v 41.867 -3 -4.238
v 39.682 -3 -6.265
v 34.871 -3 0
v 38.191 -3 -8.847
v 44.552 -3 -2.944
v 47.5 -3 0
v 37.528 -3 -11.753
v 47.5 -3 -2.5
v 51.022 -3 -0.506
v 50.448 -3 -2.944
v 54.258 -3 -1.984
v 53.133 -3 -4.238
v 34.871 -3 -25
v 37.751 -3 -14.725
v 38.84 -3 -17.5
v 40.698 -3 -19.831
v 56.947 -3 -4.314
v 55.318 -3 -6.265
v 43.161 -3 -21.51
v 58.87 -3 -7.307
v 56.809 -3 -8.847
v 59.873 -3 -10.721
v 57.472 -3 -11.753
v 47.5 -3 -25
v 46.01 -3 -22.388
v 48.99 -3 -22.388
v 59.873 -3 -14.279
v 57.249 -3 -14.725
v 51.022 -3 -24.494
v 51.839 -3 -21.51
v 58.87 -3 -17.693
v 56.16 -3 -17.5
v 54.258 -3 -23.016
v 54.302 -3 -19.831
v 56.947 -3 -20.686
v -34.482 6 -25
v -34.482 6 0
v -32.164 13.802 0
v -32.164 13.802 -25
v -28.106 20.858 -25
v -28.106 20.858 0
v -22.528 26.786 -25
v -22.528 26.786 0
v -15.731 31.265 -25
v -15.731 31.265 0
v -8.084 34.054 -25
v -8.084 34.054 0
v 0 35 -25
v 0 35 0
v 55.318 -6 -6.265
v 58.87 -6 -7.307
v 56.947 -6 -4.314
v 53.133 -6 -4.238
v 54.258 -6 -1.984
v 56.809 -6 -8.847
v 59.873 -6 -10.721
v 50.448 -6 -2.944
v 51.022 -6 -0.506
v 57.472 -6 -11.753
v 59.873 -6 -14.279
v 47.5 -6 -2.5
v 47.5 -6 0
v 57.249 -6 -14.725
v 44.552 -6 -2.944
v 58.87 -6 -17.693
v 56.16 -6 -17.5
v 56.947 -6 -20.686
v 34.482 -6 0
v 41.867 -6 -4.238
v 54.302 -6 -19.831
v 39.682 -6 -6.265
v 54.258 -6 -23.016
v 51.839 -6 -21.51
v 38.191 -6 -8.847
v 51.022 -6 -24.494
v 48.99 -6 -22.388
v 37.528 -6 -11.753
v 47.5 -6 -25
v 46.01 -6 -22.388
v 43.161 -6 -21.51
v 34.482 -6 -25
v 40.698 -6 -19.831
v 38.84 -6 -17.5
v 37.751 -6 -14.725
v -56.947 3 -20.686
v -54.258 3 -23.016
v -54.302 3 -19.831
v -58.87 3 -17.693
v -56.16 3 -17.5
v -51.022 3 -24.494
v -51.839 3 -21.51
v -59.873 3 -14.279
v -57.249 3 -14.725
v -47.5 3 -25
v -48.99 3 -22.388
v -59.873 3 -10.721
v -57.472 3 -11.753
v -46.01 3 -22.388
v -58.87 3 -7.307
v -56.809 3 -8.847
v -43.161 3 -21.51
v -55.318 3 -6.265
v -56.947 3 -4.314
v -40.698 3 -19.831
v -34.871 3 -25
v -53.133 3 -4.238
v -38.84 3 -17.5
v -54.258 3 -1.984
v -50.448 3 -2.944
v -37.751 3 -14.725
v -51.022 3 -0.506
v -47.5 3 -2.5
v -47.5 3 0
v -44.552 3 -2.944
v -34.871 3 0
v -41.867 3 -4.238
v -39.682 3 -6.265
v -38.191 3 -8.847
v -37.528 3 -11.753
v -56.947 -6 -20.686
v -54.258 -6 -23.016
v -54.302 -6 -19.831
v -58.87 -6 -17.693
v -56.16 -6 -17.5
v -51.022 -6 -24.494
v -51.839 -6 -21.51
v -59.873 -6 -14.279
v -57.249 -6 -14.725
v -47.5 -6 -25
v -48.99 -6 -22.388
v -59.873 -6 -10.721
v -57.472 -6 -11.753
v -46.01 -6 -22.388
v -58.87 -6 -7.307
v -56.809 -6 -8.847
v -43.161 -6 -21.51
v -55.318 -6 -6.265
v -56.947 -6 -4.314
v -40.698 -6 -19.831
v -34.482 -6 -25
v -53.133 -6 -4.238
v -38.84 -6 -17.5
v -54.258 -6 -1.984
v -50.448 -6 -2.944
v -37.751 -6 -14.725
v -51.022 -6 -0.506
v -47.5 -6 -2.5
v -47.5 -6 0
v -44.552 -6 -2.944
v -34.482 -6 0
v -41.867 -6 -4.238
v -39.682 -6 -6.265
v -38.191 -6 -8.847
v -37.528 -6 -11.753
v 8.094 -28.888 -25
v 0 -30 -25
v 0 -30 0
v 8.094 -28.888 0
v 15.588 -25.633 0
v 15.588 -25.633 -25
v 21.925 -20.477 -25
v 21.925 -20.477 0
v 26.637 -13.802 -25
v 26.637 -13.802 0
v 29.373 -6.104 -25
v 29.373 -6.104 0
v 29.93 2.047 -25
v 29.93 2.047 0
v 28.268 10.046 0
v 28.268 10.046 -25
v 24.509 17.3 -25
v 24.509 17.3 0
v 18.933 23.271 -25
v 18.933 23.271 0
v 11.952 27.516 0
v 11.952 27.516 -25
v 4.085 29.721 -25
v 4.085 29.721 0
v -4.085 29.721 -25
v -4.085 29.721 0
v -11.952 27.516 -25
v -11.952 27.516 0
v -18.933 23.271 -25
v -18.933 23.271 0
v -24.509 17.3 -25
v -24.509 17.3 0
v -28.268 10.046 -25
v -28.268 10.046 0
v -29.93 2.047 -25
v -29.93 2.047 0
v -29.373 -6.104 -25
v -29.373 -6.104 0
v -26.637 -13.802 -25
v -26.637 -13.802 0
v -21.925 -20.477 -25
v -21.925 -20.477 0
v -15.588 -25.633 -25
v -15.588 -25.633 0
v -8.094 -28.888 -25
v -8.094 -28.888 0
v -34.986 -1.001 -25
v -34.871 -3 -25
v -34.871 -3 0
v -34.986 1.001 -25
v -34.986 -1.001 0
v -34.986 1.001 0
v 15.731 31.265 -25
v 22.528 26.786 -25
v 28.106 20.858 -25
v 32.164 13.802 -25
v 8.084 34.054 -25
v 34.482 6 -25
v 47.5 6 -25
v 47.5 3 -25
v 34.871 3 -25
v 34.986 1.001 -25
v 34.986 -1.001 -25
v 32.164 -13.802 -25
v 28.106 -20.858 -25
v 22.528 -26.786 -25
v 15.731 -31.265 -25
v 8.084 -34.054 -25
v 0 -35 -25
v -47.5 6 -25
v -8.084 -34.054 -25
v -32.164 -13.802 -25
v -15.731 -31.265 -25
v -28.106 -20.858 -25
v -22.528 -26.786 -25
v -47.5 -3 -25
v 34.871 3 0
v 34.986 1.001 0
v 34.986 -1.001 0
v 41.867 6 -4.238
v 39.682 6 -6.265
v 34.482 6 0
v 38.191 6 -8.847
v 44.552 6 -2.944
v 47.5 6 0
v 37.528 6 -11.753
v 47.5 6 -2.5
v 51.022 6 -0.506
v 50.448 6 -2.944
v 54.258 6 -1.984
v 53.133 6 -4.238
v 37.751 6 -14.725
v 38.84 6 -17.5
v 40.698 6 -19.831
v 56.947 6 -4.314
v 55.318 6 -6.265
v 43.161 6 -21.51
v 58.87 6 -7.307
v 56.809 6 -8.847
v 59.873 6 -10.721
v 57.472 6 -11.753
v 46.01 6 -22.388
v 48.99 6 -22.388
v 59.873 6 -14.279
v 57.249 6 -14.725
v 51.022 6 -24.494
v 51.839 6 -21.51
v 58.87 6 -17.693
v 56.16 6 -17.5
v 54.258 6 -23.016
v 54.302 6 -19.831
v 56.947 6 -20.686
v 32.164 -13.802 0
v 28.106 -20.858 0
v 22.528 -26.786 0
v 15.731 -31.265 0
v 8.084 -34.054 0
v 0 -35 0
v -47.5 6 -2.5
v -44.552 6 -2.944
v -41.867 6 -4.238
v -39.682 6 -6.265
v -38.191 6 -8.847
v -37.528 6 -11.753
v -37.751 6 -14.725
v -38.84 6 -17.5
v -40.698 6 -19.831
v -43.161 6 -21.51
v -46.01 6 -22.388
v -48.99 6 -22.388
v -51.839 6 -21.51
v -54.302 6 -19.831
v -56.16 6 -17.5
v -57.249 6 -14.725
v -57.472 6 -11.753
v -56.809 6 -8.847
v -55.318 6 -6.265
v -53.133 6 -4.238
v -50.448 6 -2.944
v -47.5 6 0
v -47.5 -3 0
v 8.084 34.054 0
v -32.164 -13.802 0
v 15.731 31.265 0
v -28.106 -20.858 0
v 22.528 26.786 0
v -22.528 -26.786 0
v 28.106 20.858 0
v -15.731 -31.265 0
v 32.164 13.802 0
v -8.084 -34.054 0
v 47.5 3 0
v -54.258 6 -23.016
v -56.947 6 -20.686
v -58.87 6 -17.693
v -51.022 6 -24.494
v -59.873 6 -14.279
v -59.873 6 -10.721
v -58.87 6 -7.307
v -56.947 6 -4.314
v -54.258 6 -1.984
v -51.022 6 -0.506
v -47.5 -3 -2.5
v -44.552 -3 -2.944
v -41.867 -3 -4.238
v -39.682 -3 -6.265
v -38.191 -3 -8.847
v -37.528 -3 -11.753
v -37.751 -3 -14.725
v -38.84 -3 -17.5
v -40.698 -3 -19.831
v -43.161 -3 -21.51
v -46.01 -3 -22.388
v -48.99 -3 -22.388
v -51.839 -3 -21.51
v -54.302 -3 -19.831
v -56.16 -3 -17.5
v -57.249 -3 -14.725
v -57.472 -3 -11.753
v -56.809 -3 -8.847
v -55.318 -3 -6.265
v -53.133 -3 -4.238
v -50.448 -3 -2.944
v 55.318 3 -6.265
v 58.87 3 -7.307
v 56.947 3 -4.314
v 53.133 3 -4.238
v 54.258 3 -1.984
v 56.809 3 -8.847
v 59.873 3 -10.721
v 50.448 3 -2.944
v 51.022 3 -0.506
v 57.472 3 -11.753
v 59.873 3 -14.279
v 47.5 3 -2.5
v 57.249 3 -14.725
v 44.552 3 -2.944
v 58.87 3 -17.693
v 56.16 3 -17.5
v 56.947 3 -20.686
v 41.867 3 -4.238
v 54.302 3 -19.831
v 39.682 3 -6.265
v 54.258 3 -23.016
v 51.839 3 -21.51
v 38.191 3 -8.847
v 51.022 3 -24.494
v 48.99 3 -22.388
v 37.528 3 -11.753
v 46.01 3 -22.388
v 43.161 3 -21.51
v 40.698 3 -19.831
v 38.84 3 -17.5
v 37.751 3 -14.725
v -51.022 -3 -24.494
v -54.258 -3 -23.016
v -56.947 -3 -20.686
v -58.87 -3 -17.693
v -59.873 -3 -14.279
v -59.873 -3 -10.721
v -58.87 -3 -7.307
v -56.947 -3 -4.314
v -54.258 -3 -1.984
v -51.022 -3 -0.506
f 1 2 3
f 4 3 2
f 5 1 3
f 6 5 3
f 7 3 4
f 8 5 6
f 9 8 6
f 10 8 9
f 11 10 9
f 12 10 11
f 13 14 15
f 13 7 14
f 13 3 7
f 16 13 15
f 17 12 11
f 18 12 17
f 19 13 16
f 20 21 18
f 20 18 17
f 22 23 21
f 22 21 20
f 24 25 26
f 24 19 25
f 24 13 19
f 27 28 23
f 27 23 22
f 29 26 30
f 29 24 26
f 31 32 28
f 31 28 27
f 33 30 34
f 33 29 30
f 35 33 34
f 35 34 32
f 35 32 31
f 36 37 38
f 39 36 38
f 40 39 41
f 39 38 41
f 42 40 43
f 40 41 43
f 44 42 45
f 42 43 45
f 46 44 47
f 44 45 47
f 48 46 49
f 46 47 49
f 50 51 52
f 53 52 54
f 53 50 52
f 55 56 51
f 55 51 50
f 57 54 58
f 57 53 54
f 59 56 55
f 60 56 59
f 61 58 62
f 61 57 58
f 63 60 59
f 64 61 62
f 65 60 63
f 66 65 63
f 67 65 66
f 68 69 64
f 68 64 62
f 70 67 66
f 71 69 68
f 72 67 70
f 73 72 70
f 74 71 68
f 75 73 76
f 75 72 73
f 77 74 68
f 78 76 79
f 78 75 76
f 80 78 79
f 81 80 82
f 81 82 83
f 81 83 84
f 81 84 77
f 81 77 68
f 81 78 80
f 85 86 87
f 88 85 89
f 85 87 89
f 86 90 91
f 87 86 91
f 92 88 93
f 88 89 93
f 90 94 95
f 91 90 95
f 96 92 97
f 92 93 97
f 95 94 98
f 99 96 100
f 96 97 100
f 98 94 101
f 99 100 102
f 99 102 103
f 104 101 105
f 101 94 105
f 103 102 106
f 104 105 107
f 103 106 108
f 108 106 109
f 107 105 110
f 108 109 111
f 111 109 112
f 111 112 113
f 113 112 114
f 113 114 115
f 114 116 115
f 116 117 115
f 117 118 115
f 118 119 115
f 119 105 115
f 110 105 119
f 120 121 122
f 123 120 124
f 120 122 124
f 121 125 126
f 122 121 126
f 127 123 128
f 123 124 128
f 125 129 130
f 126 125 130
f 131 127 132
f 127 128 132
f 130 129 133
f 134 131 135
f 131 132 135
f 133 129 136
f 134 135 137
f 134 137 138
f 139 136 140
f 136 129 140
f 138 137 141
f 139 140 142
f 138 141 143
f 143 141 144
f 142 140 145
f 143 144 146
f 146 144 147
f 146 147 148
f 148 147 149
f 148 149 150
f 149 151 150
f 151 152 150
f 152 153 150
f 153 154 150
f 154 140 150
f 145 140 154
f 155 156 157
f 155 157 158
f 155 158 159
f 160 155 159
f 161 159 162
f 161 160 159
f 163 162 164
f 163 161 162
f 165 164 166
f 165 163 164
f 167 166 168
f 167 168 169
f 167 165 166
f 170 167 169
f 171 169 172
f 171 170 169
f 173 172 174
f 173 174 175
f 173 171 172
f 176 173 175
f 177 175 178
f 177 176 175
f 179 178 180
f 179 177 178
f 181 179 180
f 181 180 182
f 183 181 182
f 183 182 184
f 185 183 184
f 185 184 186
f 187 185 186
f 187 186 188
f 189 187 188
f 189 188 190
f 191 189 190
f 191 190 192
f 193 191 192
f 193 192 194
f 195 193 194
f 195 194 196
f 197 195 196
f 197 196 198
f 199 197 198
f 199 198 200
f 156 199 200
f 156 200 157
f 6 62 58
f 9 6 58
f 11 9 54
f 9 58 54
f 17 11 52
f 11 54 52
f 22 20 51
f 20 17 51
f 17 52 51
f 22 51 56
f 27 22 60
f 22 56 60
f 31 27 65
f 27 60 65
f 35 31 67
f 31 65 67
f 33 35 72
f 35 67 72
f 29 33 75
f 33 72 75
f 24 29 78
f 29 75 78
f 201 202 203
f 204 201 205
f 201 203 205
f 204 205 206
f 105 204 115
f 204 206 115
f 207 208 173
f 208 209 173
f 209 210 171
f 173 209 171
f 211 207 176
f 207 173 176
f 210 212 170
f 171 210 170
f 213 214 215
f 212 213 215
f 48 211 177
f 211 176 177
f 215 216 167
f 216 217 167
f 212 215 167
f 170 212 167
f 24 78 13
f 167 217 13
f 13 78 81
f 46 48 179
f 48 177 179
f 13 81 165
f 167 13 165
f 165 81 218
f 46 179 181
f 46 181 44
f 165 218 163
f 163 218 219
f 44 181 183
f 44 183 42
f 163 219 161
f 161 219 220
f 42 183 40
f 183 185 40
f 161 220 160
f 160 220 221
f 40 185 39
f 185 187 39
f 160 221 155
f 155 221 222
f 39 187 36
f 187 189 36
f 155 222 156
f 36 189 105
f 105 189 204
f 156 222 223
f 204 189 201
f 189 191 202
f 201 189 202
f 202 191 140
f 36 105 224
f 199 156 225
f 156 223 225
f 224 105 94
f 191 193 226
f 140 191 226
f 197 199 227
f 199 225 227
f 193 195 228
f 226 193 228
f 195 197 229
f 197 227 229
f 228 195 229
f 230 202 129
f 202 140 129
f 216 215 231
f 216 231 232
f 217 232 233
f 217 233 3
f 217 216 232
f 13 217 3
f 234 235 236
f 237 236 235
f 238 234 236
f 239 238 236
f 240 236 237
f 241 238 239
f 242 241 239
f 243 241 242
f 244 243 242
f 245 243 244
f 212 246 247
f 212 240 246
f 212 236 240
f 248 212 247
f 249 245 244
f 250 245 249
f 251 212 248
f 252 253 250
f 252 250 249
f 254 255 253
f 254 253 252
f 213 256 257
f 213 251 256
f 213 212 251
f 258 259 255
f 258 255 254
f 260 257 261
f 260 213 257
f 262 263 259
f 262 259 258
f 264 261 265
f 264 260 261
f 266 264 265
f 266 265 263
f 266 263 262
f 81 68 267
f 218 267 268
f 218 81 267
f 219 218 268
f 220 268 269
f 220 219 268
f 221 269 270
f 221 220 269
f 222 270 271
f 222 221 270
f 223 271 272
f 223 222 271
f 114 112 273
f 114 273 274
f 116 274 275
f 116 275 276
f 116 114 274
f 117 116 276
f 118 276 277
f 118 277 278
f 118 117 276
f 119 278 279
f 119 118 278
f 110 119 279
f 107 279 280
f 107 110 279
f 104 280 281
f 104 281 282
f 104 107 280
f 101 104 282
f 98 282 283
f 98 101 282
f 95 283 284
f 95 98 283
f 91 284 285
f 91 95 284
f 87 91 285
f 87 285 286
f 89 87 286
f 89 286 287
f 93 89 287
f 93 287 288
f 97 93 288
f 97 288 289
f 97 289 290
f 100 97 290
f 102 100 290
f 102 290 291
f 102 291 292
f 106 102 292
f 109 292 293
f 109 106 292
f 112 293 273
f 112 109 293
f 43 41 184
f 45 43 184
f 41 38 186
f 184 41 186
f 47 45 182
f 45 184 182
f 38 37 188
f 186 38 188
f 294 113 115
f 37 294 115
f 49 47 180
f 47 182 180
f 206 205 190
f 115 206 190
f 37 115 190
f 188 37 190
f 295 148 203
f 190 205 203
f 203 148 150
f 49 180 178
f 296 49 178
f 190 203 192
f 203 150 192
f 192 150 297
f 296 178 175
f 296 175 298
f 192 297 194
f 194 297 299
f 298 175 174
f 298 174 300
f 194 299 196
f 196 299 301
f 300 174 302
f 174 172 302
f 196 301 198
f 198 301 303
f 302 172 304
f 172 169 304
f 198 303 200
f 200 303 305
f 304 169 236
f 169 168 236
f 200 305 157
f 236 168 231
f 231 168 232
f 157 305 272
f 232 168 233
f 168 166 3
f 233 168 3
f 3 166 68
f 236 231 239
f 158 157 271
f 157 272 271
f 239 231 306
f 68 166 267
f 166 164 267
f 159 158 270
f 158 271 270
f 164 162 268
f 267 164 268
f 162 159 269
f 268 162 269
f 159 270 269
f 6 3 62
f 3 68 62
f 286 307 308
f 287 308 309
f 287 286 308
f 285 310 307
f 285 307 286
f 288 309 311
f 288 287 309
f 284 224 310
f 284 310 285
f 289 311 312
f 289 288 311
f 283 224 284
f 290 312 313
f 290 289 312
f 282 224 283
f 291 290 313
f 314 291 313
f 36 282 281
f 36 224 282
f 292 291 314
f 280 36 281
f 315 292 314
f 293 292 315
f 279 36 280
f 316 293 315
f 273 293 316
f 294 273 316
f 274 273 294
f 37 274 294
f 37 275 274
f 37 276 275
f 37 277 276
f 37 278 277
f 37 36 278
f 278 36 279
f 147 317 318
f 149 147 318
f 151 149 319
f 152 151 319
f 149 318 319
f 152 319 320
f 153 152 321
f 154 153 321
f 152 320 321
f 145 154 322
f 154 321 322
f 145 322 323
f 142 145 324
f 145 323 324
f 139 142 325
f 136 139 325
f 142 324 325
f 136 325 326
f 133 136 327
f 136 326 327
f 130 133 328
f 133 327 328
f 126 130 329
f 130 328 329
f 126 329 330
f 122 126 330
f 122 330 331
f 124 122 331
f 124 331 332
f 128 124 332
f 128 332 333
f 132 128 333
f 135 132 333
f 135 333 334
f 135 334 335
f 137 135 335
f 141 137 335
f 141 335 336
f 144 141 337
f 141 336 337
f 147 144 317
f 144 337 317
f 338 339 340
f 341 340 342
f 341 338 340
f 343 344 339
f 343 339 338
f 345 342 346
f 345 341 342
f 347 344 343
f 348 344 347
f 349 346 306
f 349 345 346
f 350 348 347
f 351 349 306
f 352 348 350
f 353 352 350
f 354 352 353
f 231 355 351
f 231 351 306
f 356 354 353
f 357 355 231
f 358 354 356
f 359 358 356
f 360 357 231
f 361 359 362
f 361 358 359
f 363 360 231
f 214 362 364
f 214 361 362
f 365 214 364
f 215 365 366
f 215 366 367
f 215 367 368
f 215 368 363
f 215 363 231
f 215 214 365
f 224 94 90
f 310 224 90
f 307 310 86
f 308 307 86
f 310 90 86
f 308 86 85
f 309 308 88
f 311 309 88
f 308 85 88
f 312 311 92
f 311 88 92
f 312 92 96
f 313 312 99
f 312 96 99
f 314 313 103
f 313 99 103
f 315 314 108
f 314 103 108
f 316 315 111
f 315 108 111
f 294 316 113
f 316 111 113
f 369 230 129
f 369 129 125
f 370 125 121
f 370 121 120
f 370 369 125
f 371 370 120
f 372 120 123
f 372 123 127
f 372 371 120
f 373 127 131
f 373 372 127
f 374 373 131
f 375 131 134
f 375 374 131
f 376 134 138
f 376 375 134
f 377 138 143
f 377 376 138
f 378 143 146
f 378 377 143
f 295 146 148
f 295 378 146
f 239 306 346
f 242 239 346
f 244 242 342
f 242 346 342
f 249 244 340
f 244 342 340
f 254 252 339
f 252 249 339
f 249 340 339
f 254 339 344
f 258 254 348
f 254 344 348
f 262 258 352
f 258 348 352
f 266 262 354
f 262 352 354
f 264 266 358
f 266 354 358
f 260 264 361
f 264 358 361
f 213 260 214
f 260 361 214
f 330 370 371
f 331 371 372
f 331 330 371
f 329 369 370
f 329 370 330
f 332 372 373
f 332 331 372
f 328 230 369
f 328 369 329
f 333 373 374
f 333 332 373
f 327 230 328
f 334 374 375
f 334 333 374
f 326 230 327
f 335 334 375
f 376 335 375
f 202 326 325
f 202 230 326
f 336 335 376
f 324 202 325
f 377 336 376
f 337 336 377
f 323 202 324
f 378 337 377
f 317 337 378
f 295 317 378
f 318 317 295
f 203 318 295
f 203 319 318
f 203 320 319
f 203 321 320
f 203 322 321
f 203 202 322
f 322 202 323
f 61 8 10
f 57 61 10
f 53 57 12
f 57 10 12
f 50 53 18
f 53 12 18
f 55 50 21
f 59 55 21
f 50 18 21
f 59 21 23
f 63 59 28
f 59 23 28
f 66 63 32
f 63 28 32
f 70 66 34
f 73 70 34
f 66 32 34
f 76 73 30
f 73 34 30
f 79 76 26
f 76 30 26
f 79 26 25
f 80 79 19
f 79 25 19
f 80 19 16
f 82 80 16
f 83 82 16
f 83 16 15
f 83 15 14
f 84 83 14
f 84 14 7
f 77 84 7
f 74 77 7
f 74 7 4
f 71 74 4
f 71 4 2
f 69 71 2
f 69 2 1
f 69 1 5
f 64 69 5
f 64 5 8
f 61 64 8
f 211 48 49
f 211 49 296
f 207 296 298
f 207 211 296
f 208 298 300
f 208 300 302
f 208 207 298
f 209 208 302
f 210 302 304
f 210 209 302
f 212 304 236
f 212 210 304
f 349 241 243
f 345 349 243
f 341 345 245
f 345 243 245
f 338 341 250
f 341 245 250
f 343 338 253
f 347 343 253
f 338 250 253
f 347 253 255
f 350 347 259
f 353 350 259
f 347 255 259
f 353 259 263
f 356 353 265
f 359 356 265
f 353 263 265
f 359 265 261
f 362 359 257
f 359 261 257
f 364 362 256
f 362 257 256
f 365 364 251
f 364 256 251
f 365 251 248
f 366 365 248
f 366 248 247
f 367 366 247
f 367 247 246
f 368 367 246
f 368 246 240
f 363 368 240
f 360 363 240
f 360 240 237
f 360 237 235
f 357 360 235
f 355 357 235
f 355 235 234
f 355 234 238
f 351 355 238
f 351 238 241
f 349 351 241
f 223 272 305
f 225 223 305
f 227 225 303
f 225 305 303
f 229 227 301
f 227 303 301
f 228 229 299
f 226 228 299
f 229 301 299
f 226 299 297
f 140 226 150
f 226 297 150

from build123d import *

# Parameters (mm, degrees)
TUBE_EXTRUDE_DEPTH                                  = 25
UPPER_START                                         = 3
PIN_RING_SKETCH_R                                   = 12.5
PIN_RING_SKETCH_R_2                                 = 10
UPPER_RIGHT_PIN_RING_EXTRUDE_DEPTH                  = 3
LOWER_START                                         = -3
PIN_RING_SKETCH_2_R                                 = 12.5
PIN_RING_SKETCH_2_R_2                               = 10
LOWER_RIGHT_PIN_RING_EXTRUDE_DEPTH                  = 3
UPPER_RIGHT_RING_CONNECTION_EXTRUDE_REACH           = 57.453
UPPER_RIGHT_RING_CONNECTION_EXTRUDE_END_RADIUS      = 35
UPPER_RIGHT_RING_CONNECTION_SKETCH_W                = 25
UPPER_RIGHT_RING_CONNECTION_SKETCH_H                = 3
UPPER_RIGHT_RING_CONNECTION_EXTRUDE_DIRE_REACH      = 57.453
UPPER_RIGHT_RING_CONNECTION_EXTRUDE_DIRE_END_RADIUS = 12.5
LOWER_RIGHT_RING_CONNECTION_EXTRUDE_REACH           = 57.453
LOWER_RIGHT_RING_CONNECTION_EXTRUDE_END_RADIUS      = 35
LOWER_RIGHT_RING_CONNECTION_SKETCH_W                = 25
LOWER_RIGHT_RING_CONNECTION_SKETCH_H                = 3
LOWER_RIGHT_RING_CONNECTION_EXTRUDE_DIRE_REACH      = 57.453
LOWER_RIGHT_RING_CONNECTION_EXTRUDE_DIRE_END_RADIUS = 12.5
FAULTY_START                                        = -35
FAULTY_MIRROR_DEPTH                                 = 70
FAULTY_START_2                                      = -25
FAULTY_MIRROR_2_DEPTH                               = 25
MIRROR_HACK_CUT_REACH                               = 78.851
MIRROR_HACK_SKETCH_R                                = 10


with BuildPart() as part:
    # Tube Sketch → Tube Extrude (new body)
    with BuildSketch(Plane.XY):
        with BuildLine():
            Line((0, 35), (0, 30))
            ThreePointArc((0, 30), (-30, 0), (0, -30))
            Line((0, -30), (0, -35))
            ThreePointArc((0, -35), (-35, 0), (0, 35))
        make_face()
    extrude(amount=-TUBE_EXTRUDE_DEPTH)



with BuildPart() as body_2:
    # Pin Ring Sketch → Upper Right Pin Ring Extrude (new body)
    with BuildSketch(Plane(origin=(0, 0, 0), x_dir=(1, 0, 0), z_dir=(0, 1, 0)).offset(UPPER_START)):
        with Locations(Location((-47.5, 12.5, 0), (0, 0, 270))):
            Circle(PIN_RING_SKETCH_R)
        with Locations(Location((-47.5, 12.5, 0), (0, 0, 270))):
            Circle(PIN_RING_SKETCH_R_2, mode=Mode.SUBTRACT)
    extrude(amount=UPPER_RIGHT_PIN_RING_EXTRUDE_DEPTH)


with BuildPart() as body_3:
    # Pin Ring Sketch<2> → Lower Right Pin Ring Extrude (new body)
    with BuildSketch(Plane(origin=(0, 0, 0), x_dir=(1, 0, 0), z_dir=(0, 1, 0)).offset(LOWER_START)):
        with Locations(Location((-47.5, 12.5, 0), (0, 0, 270))):
            Circle(PIN_RING_SKETCH_2_R)
        with Locations(Location((-47.5, 12.5, 0), (0, 0, 270))):
            Circle(PIN_RING_SKETCH_2_R_2, mode=Mode.SUBTRACT)
    extrude(amount=-LOWER_RIGHT_PIN_RING_EXTRUDE_DEPTH)


with BuildPart() as part_1:
    add(part.part)

    add(body_2.part)  # Upper Right Ring Connection Extrude merges body 2
    # Upper Right Ring Connection Extrude: up to this cylinder (the profile starts outside it)
    upper_right_ring_connection_extrude_end = Plane(origin=(0, 0, -12.5), z_dir=(0, 0, 1)) * Cylinder(UPPER_RIGHT_RING_CONNECTION_EXTRUDE_END_RADIUS, 185.906, mode=Mode.PRIVATE)
    # Upper Right Ring Connection Sketch → Upper Right Ring Connection Extrude (add, up to the surface)
    with BuildSketch(Plane.ZY.offset(35), mode=Mode.PRIVATE) as upper_right_ring_connection_extrude_sk1:
        with Locations((-12.5, 4.5)):
            Rectangle(UPPER_RIGHT_RING_CONNECTION_SKETCH_W, UPPER_RIGHT_RING_CONNECTION_SKETCH_H)
    upper_right_ring_connection_extrude_tool1 = extrude(upper_right_ring_connection_extrude_sk1.sketch, amount=-UPPER_RIGHT_RING_CONNECTION_EXTRUDE_REACH, mode=Mode.PRIVATE) - upper_right_ring_connection_extrude_end
    add(upper_right_ring_connection_extrude_tool1.solids().sort_by_distance((-35, 4.5, -12.5))[0])

    # Upper Right Ring Connection Extrude dire: up to this cylinder (the profile starts outside it)
    upper_right_ring_connection_extrude_dire_end = Plane(origin=(-47.5, 4.5, -12.5), z_dir=(0, -1, 0)) * Cylinder(UPPER_RIGHT_RING_CONNECTION_EXTRUDE_DIRE_END_RADIUS, 140.906, mode=Mode.PRIVATE)
    # Upper Right Ring Connection Sketch → Upper Right Ring Connection Extrude dire (add, up to the surface)
    with BuildSketch(Plane.ZY.offset(35), mode=Mode.PRIVATE) as upper_right_ring_connection_extrude_dire_sk1:
        with Locations((-12.5, 4.5)):
            Rectangle(UPPER_RIGHT_RING_CONNECTION_SKETCH_W, UPPER_RIGHT_RING_CONNECTION_SKETCH_H)
    upper_right_ring_connection_extrude_dire_tool1 = extrude(upper_right_ring_connection_extrude_dire_sk1.sketch, amount=UPPER_RIGHT_RING_CONNECTION_EXTRUDE_DIRE_REACH, mode=Mode.PRIVATE) - upper_right_ring_connection_extrude_dire_end
    add(upper_right_ring_connection_extrude_dire_tool1.solids().sort_by_distance((-35, 4.5, -12.5))[0])
    add(upper_right_ring_connection_extrude_dire_tool1.solids().sort_by_distance((-35, 4.5, -12.5))[1])


    add(body_3.part)  # Lower Right Ring Connection Extrude merges body 3
    # Lower Right Ring Connection Extrude: up to this cylinder (the profile starts outside it)
    lower_right_ring_connection_extrude_end = Plane(origin=(0, 0, -12.5), z_dir=(0, 0, 1)) * Cylinder(LOWER_RIGHT_RING_CONNECTION_EXTRUDE_END_RADIUS, 185.906, mode=Mode.PRIVATE)
    # Lower Right Ring Connection Sketch → Lower Right Ring Connection Extrude (add, up to the surface)
    with BuildSketch(Plane.ZY.offset(35), mode=Mode.PRIVATE) as lower_right_ring_connection_extrude_sk1:
        with Locations((-12.5, -4.5)):
            Rectangle(LOWER_RIGHT_RING_CONNECTION_SKETCH_W, LOWER_RIGHT_RING_CONNECTION_SKETCH_H)
    lower_right_ring_connection_extrude_tool1 = extrude(lower_right_ring_connection_extrude_sk1.sketch, amount=-LOWER_RIGHT_RING_CONNECTION_EXTRUDE_REACH, mode=Mode.PRIVATE) - lower_right_ring_connection_extrude_end
    add(lower_right_ring_connection_extrude_tool1.solids().sort_by_distance((-35, -4.5, -12.5))[0])

    # Lower Right Ring Connection Extrude dire: up to this cylinder (the profile starts outside it)
    lower_right_ring_connection_extrude_dire_end = Plane(origin=(-47.5, -4.5, -12.5), z_dir=(0, 1, 0)) * Cylinder(LOWER_RIGHT_RING_CONNECTION_EXTRUDE_DIRE_END_RADIUS, 140.906, mode=Mode.PRIVATE)
    # Lower Right Ring Connection Sketch → Lower Right Ring Connection Extrude dire (add, up to the surface)
    with BuildSketch(Plane.ZY.offset(35), mode=Mode.PRIVATE) as lower_right_ring_connection_extrude_dire_sk1:
        with Locations((-12.5, -4.5)):
            Rectangle(LOWER_RIGHT_RING_CONNECTION_SKETCH_W, LOWER_RIGHT_RING_CONNECTION_SKETCH_H)
    lower_right_ring_connection_extrude_dire_tool1 = extrude(lower_right_ring_connection_extrude_dire_sk1.sketch, amount=LOWER_RIGHT_RING_CONNECTION_EXTRUDE_DIRE_REACH, mode=Mode.PRIVATE) - lower_right_ring_connection_extrude_dire_end
    add(lower_right_ring_connection_extrude_dire_tool1.solids().sort_by_distance((-35, -4.5, -12.5))[0])
    add(lower_right_ring_connection_extrude_dire_tool1.solids().sort_by_distance((-35, -4.5, -12.5))[1])

    # Faulty Mirror: read off the stored shape, not the designer's step
    # Faulty Mirror outline → Faulty Mirror (add)
    with BuildSketch(Plane(origin=(0, 0, 0), x_dir=(1, 0, 0), z_dir=(0, 1, 0)).offset(FAULTY_START)):
        with BuildLine():
            Line((47.5, 25), (0, 25))
            Line((0, 25), (0, 0))
            Line((0, 0), (47.5, 0))
            ThreePointArc((47.5, 0), (60, 12.5), (47.5, 25))
        make_face()
    extrude(amount=FAULTY_MIRROR_DEPTH)

    # Faulty Mirror 2 outline → Faulty Mirror 2 (cut)
    with BuildSketch(Plane.XY.offset(FAULTY_START_2)):
        with BuildLine():
            ThreePointArc((34.871191548, 3), (35, 0), (34.871191548, -3))
            Line((34.871191548, -3), (61, -3))
            Line((61, -3), (61, 3))
            Line((61, 3), (34.871191548, 3))
        make_face()
        with BuildLine():
            Line((61, -35), (61, -6))
            Line((61, -6), (34.481879299, -6))
            ThreePointArc((34.481879299, -6), (22.527760652, -26.786190472), (0, -35))
            Line((0, -35), (61, -35))
        make_face()
        with BuildLine():
            Line((34.481879299, 6), (61, 6))
            Line((61, 6), (61, 35))
            Line((61, 35), (0, 35))
            ThreePointArc((0, 35), (22.527760652, 26.786190472), (34.481879299, 6))
        make_face()
        with BuildLine():
            Line((0, 30), (0, -30))
            ThreePointArc((0, -30), (30, 0), (0, 30))
        make_face()
    extrude(amount=FAULTY_MIRROR_2_DEPTH, mode=Mode.SUBTRACT)

    # Mirror Hack Cut: up to this face of the body (flat: up to its plane)
    mirror_hack_cut_end = Plane(part_1.part.faces().sort_by_distance((46.070109689, -6, -12.5))[0])
    # Mirror Hack Sketch → Mirror Hack Cut (cut, up to the picked face)
    with BuildSketch(Plane(origin=(0, 6, 0), x_dir=(1, 0, 0), z_dir=(0, 1, 0)), mode=Mode.PRIVATE) as mirror_hack_cut_sk1:
        with Locations(Location((47.5, 12.5, 0), (0, 0, 270))):
            Circle(MIRROR_HACK_SKETCH_R)
    mirror_hack_cut_tool1 = split(extrude(mirror_hack_cut_sk1.sketch, amount=-MIRROR_HACK_CUT_REACH, mode=Mode.PRIVATE), bisect_by=mirror_hack_cut_end, keep=Keep.BOTH, mode=Mode.PRIVATE)
    add(mirror_hack_cut_tool1.solids().sort_by(Axis((47.5, 6, -12.5), (0, -1, 0)))[0], mode=Mode.SUBTRACT)


solid = part_1.part
